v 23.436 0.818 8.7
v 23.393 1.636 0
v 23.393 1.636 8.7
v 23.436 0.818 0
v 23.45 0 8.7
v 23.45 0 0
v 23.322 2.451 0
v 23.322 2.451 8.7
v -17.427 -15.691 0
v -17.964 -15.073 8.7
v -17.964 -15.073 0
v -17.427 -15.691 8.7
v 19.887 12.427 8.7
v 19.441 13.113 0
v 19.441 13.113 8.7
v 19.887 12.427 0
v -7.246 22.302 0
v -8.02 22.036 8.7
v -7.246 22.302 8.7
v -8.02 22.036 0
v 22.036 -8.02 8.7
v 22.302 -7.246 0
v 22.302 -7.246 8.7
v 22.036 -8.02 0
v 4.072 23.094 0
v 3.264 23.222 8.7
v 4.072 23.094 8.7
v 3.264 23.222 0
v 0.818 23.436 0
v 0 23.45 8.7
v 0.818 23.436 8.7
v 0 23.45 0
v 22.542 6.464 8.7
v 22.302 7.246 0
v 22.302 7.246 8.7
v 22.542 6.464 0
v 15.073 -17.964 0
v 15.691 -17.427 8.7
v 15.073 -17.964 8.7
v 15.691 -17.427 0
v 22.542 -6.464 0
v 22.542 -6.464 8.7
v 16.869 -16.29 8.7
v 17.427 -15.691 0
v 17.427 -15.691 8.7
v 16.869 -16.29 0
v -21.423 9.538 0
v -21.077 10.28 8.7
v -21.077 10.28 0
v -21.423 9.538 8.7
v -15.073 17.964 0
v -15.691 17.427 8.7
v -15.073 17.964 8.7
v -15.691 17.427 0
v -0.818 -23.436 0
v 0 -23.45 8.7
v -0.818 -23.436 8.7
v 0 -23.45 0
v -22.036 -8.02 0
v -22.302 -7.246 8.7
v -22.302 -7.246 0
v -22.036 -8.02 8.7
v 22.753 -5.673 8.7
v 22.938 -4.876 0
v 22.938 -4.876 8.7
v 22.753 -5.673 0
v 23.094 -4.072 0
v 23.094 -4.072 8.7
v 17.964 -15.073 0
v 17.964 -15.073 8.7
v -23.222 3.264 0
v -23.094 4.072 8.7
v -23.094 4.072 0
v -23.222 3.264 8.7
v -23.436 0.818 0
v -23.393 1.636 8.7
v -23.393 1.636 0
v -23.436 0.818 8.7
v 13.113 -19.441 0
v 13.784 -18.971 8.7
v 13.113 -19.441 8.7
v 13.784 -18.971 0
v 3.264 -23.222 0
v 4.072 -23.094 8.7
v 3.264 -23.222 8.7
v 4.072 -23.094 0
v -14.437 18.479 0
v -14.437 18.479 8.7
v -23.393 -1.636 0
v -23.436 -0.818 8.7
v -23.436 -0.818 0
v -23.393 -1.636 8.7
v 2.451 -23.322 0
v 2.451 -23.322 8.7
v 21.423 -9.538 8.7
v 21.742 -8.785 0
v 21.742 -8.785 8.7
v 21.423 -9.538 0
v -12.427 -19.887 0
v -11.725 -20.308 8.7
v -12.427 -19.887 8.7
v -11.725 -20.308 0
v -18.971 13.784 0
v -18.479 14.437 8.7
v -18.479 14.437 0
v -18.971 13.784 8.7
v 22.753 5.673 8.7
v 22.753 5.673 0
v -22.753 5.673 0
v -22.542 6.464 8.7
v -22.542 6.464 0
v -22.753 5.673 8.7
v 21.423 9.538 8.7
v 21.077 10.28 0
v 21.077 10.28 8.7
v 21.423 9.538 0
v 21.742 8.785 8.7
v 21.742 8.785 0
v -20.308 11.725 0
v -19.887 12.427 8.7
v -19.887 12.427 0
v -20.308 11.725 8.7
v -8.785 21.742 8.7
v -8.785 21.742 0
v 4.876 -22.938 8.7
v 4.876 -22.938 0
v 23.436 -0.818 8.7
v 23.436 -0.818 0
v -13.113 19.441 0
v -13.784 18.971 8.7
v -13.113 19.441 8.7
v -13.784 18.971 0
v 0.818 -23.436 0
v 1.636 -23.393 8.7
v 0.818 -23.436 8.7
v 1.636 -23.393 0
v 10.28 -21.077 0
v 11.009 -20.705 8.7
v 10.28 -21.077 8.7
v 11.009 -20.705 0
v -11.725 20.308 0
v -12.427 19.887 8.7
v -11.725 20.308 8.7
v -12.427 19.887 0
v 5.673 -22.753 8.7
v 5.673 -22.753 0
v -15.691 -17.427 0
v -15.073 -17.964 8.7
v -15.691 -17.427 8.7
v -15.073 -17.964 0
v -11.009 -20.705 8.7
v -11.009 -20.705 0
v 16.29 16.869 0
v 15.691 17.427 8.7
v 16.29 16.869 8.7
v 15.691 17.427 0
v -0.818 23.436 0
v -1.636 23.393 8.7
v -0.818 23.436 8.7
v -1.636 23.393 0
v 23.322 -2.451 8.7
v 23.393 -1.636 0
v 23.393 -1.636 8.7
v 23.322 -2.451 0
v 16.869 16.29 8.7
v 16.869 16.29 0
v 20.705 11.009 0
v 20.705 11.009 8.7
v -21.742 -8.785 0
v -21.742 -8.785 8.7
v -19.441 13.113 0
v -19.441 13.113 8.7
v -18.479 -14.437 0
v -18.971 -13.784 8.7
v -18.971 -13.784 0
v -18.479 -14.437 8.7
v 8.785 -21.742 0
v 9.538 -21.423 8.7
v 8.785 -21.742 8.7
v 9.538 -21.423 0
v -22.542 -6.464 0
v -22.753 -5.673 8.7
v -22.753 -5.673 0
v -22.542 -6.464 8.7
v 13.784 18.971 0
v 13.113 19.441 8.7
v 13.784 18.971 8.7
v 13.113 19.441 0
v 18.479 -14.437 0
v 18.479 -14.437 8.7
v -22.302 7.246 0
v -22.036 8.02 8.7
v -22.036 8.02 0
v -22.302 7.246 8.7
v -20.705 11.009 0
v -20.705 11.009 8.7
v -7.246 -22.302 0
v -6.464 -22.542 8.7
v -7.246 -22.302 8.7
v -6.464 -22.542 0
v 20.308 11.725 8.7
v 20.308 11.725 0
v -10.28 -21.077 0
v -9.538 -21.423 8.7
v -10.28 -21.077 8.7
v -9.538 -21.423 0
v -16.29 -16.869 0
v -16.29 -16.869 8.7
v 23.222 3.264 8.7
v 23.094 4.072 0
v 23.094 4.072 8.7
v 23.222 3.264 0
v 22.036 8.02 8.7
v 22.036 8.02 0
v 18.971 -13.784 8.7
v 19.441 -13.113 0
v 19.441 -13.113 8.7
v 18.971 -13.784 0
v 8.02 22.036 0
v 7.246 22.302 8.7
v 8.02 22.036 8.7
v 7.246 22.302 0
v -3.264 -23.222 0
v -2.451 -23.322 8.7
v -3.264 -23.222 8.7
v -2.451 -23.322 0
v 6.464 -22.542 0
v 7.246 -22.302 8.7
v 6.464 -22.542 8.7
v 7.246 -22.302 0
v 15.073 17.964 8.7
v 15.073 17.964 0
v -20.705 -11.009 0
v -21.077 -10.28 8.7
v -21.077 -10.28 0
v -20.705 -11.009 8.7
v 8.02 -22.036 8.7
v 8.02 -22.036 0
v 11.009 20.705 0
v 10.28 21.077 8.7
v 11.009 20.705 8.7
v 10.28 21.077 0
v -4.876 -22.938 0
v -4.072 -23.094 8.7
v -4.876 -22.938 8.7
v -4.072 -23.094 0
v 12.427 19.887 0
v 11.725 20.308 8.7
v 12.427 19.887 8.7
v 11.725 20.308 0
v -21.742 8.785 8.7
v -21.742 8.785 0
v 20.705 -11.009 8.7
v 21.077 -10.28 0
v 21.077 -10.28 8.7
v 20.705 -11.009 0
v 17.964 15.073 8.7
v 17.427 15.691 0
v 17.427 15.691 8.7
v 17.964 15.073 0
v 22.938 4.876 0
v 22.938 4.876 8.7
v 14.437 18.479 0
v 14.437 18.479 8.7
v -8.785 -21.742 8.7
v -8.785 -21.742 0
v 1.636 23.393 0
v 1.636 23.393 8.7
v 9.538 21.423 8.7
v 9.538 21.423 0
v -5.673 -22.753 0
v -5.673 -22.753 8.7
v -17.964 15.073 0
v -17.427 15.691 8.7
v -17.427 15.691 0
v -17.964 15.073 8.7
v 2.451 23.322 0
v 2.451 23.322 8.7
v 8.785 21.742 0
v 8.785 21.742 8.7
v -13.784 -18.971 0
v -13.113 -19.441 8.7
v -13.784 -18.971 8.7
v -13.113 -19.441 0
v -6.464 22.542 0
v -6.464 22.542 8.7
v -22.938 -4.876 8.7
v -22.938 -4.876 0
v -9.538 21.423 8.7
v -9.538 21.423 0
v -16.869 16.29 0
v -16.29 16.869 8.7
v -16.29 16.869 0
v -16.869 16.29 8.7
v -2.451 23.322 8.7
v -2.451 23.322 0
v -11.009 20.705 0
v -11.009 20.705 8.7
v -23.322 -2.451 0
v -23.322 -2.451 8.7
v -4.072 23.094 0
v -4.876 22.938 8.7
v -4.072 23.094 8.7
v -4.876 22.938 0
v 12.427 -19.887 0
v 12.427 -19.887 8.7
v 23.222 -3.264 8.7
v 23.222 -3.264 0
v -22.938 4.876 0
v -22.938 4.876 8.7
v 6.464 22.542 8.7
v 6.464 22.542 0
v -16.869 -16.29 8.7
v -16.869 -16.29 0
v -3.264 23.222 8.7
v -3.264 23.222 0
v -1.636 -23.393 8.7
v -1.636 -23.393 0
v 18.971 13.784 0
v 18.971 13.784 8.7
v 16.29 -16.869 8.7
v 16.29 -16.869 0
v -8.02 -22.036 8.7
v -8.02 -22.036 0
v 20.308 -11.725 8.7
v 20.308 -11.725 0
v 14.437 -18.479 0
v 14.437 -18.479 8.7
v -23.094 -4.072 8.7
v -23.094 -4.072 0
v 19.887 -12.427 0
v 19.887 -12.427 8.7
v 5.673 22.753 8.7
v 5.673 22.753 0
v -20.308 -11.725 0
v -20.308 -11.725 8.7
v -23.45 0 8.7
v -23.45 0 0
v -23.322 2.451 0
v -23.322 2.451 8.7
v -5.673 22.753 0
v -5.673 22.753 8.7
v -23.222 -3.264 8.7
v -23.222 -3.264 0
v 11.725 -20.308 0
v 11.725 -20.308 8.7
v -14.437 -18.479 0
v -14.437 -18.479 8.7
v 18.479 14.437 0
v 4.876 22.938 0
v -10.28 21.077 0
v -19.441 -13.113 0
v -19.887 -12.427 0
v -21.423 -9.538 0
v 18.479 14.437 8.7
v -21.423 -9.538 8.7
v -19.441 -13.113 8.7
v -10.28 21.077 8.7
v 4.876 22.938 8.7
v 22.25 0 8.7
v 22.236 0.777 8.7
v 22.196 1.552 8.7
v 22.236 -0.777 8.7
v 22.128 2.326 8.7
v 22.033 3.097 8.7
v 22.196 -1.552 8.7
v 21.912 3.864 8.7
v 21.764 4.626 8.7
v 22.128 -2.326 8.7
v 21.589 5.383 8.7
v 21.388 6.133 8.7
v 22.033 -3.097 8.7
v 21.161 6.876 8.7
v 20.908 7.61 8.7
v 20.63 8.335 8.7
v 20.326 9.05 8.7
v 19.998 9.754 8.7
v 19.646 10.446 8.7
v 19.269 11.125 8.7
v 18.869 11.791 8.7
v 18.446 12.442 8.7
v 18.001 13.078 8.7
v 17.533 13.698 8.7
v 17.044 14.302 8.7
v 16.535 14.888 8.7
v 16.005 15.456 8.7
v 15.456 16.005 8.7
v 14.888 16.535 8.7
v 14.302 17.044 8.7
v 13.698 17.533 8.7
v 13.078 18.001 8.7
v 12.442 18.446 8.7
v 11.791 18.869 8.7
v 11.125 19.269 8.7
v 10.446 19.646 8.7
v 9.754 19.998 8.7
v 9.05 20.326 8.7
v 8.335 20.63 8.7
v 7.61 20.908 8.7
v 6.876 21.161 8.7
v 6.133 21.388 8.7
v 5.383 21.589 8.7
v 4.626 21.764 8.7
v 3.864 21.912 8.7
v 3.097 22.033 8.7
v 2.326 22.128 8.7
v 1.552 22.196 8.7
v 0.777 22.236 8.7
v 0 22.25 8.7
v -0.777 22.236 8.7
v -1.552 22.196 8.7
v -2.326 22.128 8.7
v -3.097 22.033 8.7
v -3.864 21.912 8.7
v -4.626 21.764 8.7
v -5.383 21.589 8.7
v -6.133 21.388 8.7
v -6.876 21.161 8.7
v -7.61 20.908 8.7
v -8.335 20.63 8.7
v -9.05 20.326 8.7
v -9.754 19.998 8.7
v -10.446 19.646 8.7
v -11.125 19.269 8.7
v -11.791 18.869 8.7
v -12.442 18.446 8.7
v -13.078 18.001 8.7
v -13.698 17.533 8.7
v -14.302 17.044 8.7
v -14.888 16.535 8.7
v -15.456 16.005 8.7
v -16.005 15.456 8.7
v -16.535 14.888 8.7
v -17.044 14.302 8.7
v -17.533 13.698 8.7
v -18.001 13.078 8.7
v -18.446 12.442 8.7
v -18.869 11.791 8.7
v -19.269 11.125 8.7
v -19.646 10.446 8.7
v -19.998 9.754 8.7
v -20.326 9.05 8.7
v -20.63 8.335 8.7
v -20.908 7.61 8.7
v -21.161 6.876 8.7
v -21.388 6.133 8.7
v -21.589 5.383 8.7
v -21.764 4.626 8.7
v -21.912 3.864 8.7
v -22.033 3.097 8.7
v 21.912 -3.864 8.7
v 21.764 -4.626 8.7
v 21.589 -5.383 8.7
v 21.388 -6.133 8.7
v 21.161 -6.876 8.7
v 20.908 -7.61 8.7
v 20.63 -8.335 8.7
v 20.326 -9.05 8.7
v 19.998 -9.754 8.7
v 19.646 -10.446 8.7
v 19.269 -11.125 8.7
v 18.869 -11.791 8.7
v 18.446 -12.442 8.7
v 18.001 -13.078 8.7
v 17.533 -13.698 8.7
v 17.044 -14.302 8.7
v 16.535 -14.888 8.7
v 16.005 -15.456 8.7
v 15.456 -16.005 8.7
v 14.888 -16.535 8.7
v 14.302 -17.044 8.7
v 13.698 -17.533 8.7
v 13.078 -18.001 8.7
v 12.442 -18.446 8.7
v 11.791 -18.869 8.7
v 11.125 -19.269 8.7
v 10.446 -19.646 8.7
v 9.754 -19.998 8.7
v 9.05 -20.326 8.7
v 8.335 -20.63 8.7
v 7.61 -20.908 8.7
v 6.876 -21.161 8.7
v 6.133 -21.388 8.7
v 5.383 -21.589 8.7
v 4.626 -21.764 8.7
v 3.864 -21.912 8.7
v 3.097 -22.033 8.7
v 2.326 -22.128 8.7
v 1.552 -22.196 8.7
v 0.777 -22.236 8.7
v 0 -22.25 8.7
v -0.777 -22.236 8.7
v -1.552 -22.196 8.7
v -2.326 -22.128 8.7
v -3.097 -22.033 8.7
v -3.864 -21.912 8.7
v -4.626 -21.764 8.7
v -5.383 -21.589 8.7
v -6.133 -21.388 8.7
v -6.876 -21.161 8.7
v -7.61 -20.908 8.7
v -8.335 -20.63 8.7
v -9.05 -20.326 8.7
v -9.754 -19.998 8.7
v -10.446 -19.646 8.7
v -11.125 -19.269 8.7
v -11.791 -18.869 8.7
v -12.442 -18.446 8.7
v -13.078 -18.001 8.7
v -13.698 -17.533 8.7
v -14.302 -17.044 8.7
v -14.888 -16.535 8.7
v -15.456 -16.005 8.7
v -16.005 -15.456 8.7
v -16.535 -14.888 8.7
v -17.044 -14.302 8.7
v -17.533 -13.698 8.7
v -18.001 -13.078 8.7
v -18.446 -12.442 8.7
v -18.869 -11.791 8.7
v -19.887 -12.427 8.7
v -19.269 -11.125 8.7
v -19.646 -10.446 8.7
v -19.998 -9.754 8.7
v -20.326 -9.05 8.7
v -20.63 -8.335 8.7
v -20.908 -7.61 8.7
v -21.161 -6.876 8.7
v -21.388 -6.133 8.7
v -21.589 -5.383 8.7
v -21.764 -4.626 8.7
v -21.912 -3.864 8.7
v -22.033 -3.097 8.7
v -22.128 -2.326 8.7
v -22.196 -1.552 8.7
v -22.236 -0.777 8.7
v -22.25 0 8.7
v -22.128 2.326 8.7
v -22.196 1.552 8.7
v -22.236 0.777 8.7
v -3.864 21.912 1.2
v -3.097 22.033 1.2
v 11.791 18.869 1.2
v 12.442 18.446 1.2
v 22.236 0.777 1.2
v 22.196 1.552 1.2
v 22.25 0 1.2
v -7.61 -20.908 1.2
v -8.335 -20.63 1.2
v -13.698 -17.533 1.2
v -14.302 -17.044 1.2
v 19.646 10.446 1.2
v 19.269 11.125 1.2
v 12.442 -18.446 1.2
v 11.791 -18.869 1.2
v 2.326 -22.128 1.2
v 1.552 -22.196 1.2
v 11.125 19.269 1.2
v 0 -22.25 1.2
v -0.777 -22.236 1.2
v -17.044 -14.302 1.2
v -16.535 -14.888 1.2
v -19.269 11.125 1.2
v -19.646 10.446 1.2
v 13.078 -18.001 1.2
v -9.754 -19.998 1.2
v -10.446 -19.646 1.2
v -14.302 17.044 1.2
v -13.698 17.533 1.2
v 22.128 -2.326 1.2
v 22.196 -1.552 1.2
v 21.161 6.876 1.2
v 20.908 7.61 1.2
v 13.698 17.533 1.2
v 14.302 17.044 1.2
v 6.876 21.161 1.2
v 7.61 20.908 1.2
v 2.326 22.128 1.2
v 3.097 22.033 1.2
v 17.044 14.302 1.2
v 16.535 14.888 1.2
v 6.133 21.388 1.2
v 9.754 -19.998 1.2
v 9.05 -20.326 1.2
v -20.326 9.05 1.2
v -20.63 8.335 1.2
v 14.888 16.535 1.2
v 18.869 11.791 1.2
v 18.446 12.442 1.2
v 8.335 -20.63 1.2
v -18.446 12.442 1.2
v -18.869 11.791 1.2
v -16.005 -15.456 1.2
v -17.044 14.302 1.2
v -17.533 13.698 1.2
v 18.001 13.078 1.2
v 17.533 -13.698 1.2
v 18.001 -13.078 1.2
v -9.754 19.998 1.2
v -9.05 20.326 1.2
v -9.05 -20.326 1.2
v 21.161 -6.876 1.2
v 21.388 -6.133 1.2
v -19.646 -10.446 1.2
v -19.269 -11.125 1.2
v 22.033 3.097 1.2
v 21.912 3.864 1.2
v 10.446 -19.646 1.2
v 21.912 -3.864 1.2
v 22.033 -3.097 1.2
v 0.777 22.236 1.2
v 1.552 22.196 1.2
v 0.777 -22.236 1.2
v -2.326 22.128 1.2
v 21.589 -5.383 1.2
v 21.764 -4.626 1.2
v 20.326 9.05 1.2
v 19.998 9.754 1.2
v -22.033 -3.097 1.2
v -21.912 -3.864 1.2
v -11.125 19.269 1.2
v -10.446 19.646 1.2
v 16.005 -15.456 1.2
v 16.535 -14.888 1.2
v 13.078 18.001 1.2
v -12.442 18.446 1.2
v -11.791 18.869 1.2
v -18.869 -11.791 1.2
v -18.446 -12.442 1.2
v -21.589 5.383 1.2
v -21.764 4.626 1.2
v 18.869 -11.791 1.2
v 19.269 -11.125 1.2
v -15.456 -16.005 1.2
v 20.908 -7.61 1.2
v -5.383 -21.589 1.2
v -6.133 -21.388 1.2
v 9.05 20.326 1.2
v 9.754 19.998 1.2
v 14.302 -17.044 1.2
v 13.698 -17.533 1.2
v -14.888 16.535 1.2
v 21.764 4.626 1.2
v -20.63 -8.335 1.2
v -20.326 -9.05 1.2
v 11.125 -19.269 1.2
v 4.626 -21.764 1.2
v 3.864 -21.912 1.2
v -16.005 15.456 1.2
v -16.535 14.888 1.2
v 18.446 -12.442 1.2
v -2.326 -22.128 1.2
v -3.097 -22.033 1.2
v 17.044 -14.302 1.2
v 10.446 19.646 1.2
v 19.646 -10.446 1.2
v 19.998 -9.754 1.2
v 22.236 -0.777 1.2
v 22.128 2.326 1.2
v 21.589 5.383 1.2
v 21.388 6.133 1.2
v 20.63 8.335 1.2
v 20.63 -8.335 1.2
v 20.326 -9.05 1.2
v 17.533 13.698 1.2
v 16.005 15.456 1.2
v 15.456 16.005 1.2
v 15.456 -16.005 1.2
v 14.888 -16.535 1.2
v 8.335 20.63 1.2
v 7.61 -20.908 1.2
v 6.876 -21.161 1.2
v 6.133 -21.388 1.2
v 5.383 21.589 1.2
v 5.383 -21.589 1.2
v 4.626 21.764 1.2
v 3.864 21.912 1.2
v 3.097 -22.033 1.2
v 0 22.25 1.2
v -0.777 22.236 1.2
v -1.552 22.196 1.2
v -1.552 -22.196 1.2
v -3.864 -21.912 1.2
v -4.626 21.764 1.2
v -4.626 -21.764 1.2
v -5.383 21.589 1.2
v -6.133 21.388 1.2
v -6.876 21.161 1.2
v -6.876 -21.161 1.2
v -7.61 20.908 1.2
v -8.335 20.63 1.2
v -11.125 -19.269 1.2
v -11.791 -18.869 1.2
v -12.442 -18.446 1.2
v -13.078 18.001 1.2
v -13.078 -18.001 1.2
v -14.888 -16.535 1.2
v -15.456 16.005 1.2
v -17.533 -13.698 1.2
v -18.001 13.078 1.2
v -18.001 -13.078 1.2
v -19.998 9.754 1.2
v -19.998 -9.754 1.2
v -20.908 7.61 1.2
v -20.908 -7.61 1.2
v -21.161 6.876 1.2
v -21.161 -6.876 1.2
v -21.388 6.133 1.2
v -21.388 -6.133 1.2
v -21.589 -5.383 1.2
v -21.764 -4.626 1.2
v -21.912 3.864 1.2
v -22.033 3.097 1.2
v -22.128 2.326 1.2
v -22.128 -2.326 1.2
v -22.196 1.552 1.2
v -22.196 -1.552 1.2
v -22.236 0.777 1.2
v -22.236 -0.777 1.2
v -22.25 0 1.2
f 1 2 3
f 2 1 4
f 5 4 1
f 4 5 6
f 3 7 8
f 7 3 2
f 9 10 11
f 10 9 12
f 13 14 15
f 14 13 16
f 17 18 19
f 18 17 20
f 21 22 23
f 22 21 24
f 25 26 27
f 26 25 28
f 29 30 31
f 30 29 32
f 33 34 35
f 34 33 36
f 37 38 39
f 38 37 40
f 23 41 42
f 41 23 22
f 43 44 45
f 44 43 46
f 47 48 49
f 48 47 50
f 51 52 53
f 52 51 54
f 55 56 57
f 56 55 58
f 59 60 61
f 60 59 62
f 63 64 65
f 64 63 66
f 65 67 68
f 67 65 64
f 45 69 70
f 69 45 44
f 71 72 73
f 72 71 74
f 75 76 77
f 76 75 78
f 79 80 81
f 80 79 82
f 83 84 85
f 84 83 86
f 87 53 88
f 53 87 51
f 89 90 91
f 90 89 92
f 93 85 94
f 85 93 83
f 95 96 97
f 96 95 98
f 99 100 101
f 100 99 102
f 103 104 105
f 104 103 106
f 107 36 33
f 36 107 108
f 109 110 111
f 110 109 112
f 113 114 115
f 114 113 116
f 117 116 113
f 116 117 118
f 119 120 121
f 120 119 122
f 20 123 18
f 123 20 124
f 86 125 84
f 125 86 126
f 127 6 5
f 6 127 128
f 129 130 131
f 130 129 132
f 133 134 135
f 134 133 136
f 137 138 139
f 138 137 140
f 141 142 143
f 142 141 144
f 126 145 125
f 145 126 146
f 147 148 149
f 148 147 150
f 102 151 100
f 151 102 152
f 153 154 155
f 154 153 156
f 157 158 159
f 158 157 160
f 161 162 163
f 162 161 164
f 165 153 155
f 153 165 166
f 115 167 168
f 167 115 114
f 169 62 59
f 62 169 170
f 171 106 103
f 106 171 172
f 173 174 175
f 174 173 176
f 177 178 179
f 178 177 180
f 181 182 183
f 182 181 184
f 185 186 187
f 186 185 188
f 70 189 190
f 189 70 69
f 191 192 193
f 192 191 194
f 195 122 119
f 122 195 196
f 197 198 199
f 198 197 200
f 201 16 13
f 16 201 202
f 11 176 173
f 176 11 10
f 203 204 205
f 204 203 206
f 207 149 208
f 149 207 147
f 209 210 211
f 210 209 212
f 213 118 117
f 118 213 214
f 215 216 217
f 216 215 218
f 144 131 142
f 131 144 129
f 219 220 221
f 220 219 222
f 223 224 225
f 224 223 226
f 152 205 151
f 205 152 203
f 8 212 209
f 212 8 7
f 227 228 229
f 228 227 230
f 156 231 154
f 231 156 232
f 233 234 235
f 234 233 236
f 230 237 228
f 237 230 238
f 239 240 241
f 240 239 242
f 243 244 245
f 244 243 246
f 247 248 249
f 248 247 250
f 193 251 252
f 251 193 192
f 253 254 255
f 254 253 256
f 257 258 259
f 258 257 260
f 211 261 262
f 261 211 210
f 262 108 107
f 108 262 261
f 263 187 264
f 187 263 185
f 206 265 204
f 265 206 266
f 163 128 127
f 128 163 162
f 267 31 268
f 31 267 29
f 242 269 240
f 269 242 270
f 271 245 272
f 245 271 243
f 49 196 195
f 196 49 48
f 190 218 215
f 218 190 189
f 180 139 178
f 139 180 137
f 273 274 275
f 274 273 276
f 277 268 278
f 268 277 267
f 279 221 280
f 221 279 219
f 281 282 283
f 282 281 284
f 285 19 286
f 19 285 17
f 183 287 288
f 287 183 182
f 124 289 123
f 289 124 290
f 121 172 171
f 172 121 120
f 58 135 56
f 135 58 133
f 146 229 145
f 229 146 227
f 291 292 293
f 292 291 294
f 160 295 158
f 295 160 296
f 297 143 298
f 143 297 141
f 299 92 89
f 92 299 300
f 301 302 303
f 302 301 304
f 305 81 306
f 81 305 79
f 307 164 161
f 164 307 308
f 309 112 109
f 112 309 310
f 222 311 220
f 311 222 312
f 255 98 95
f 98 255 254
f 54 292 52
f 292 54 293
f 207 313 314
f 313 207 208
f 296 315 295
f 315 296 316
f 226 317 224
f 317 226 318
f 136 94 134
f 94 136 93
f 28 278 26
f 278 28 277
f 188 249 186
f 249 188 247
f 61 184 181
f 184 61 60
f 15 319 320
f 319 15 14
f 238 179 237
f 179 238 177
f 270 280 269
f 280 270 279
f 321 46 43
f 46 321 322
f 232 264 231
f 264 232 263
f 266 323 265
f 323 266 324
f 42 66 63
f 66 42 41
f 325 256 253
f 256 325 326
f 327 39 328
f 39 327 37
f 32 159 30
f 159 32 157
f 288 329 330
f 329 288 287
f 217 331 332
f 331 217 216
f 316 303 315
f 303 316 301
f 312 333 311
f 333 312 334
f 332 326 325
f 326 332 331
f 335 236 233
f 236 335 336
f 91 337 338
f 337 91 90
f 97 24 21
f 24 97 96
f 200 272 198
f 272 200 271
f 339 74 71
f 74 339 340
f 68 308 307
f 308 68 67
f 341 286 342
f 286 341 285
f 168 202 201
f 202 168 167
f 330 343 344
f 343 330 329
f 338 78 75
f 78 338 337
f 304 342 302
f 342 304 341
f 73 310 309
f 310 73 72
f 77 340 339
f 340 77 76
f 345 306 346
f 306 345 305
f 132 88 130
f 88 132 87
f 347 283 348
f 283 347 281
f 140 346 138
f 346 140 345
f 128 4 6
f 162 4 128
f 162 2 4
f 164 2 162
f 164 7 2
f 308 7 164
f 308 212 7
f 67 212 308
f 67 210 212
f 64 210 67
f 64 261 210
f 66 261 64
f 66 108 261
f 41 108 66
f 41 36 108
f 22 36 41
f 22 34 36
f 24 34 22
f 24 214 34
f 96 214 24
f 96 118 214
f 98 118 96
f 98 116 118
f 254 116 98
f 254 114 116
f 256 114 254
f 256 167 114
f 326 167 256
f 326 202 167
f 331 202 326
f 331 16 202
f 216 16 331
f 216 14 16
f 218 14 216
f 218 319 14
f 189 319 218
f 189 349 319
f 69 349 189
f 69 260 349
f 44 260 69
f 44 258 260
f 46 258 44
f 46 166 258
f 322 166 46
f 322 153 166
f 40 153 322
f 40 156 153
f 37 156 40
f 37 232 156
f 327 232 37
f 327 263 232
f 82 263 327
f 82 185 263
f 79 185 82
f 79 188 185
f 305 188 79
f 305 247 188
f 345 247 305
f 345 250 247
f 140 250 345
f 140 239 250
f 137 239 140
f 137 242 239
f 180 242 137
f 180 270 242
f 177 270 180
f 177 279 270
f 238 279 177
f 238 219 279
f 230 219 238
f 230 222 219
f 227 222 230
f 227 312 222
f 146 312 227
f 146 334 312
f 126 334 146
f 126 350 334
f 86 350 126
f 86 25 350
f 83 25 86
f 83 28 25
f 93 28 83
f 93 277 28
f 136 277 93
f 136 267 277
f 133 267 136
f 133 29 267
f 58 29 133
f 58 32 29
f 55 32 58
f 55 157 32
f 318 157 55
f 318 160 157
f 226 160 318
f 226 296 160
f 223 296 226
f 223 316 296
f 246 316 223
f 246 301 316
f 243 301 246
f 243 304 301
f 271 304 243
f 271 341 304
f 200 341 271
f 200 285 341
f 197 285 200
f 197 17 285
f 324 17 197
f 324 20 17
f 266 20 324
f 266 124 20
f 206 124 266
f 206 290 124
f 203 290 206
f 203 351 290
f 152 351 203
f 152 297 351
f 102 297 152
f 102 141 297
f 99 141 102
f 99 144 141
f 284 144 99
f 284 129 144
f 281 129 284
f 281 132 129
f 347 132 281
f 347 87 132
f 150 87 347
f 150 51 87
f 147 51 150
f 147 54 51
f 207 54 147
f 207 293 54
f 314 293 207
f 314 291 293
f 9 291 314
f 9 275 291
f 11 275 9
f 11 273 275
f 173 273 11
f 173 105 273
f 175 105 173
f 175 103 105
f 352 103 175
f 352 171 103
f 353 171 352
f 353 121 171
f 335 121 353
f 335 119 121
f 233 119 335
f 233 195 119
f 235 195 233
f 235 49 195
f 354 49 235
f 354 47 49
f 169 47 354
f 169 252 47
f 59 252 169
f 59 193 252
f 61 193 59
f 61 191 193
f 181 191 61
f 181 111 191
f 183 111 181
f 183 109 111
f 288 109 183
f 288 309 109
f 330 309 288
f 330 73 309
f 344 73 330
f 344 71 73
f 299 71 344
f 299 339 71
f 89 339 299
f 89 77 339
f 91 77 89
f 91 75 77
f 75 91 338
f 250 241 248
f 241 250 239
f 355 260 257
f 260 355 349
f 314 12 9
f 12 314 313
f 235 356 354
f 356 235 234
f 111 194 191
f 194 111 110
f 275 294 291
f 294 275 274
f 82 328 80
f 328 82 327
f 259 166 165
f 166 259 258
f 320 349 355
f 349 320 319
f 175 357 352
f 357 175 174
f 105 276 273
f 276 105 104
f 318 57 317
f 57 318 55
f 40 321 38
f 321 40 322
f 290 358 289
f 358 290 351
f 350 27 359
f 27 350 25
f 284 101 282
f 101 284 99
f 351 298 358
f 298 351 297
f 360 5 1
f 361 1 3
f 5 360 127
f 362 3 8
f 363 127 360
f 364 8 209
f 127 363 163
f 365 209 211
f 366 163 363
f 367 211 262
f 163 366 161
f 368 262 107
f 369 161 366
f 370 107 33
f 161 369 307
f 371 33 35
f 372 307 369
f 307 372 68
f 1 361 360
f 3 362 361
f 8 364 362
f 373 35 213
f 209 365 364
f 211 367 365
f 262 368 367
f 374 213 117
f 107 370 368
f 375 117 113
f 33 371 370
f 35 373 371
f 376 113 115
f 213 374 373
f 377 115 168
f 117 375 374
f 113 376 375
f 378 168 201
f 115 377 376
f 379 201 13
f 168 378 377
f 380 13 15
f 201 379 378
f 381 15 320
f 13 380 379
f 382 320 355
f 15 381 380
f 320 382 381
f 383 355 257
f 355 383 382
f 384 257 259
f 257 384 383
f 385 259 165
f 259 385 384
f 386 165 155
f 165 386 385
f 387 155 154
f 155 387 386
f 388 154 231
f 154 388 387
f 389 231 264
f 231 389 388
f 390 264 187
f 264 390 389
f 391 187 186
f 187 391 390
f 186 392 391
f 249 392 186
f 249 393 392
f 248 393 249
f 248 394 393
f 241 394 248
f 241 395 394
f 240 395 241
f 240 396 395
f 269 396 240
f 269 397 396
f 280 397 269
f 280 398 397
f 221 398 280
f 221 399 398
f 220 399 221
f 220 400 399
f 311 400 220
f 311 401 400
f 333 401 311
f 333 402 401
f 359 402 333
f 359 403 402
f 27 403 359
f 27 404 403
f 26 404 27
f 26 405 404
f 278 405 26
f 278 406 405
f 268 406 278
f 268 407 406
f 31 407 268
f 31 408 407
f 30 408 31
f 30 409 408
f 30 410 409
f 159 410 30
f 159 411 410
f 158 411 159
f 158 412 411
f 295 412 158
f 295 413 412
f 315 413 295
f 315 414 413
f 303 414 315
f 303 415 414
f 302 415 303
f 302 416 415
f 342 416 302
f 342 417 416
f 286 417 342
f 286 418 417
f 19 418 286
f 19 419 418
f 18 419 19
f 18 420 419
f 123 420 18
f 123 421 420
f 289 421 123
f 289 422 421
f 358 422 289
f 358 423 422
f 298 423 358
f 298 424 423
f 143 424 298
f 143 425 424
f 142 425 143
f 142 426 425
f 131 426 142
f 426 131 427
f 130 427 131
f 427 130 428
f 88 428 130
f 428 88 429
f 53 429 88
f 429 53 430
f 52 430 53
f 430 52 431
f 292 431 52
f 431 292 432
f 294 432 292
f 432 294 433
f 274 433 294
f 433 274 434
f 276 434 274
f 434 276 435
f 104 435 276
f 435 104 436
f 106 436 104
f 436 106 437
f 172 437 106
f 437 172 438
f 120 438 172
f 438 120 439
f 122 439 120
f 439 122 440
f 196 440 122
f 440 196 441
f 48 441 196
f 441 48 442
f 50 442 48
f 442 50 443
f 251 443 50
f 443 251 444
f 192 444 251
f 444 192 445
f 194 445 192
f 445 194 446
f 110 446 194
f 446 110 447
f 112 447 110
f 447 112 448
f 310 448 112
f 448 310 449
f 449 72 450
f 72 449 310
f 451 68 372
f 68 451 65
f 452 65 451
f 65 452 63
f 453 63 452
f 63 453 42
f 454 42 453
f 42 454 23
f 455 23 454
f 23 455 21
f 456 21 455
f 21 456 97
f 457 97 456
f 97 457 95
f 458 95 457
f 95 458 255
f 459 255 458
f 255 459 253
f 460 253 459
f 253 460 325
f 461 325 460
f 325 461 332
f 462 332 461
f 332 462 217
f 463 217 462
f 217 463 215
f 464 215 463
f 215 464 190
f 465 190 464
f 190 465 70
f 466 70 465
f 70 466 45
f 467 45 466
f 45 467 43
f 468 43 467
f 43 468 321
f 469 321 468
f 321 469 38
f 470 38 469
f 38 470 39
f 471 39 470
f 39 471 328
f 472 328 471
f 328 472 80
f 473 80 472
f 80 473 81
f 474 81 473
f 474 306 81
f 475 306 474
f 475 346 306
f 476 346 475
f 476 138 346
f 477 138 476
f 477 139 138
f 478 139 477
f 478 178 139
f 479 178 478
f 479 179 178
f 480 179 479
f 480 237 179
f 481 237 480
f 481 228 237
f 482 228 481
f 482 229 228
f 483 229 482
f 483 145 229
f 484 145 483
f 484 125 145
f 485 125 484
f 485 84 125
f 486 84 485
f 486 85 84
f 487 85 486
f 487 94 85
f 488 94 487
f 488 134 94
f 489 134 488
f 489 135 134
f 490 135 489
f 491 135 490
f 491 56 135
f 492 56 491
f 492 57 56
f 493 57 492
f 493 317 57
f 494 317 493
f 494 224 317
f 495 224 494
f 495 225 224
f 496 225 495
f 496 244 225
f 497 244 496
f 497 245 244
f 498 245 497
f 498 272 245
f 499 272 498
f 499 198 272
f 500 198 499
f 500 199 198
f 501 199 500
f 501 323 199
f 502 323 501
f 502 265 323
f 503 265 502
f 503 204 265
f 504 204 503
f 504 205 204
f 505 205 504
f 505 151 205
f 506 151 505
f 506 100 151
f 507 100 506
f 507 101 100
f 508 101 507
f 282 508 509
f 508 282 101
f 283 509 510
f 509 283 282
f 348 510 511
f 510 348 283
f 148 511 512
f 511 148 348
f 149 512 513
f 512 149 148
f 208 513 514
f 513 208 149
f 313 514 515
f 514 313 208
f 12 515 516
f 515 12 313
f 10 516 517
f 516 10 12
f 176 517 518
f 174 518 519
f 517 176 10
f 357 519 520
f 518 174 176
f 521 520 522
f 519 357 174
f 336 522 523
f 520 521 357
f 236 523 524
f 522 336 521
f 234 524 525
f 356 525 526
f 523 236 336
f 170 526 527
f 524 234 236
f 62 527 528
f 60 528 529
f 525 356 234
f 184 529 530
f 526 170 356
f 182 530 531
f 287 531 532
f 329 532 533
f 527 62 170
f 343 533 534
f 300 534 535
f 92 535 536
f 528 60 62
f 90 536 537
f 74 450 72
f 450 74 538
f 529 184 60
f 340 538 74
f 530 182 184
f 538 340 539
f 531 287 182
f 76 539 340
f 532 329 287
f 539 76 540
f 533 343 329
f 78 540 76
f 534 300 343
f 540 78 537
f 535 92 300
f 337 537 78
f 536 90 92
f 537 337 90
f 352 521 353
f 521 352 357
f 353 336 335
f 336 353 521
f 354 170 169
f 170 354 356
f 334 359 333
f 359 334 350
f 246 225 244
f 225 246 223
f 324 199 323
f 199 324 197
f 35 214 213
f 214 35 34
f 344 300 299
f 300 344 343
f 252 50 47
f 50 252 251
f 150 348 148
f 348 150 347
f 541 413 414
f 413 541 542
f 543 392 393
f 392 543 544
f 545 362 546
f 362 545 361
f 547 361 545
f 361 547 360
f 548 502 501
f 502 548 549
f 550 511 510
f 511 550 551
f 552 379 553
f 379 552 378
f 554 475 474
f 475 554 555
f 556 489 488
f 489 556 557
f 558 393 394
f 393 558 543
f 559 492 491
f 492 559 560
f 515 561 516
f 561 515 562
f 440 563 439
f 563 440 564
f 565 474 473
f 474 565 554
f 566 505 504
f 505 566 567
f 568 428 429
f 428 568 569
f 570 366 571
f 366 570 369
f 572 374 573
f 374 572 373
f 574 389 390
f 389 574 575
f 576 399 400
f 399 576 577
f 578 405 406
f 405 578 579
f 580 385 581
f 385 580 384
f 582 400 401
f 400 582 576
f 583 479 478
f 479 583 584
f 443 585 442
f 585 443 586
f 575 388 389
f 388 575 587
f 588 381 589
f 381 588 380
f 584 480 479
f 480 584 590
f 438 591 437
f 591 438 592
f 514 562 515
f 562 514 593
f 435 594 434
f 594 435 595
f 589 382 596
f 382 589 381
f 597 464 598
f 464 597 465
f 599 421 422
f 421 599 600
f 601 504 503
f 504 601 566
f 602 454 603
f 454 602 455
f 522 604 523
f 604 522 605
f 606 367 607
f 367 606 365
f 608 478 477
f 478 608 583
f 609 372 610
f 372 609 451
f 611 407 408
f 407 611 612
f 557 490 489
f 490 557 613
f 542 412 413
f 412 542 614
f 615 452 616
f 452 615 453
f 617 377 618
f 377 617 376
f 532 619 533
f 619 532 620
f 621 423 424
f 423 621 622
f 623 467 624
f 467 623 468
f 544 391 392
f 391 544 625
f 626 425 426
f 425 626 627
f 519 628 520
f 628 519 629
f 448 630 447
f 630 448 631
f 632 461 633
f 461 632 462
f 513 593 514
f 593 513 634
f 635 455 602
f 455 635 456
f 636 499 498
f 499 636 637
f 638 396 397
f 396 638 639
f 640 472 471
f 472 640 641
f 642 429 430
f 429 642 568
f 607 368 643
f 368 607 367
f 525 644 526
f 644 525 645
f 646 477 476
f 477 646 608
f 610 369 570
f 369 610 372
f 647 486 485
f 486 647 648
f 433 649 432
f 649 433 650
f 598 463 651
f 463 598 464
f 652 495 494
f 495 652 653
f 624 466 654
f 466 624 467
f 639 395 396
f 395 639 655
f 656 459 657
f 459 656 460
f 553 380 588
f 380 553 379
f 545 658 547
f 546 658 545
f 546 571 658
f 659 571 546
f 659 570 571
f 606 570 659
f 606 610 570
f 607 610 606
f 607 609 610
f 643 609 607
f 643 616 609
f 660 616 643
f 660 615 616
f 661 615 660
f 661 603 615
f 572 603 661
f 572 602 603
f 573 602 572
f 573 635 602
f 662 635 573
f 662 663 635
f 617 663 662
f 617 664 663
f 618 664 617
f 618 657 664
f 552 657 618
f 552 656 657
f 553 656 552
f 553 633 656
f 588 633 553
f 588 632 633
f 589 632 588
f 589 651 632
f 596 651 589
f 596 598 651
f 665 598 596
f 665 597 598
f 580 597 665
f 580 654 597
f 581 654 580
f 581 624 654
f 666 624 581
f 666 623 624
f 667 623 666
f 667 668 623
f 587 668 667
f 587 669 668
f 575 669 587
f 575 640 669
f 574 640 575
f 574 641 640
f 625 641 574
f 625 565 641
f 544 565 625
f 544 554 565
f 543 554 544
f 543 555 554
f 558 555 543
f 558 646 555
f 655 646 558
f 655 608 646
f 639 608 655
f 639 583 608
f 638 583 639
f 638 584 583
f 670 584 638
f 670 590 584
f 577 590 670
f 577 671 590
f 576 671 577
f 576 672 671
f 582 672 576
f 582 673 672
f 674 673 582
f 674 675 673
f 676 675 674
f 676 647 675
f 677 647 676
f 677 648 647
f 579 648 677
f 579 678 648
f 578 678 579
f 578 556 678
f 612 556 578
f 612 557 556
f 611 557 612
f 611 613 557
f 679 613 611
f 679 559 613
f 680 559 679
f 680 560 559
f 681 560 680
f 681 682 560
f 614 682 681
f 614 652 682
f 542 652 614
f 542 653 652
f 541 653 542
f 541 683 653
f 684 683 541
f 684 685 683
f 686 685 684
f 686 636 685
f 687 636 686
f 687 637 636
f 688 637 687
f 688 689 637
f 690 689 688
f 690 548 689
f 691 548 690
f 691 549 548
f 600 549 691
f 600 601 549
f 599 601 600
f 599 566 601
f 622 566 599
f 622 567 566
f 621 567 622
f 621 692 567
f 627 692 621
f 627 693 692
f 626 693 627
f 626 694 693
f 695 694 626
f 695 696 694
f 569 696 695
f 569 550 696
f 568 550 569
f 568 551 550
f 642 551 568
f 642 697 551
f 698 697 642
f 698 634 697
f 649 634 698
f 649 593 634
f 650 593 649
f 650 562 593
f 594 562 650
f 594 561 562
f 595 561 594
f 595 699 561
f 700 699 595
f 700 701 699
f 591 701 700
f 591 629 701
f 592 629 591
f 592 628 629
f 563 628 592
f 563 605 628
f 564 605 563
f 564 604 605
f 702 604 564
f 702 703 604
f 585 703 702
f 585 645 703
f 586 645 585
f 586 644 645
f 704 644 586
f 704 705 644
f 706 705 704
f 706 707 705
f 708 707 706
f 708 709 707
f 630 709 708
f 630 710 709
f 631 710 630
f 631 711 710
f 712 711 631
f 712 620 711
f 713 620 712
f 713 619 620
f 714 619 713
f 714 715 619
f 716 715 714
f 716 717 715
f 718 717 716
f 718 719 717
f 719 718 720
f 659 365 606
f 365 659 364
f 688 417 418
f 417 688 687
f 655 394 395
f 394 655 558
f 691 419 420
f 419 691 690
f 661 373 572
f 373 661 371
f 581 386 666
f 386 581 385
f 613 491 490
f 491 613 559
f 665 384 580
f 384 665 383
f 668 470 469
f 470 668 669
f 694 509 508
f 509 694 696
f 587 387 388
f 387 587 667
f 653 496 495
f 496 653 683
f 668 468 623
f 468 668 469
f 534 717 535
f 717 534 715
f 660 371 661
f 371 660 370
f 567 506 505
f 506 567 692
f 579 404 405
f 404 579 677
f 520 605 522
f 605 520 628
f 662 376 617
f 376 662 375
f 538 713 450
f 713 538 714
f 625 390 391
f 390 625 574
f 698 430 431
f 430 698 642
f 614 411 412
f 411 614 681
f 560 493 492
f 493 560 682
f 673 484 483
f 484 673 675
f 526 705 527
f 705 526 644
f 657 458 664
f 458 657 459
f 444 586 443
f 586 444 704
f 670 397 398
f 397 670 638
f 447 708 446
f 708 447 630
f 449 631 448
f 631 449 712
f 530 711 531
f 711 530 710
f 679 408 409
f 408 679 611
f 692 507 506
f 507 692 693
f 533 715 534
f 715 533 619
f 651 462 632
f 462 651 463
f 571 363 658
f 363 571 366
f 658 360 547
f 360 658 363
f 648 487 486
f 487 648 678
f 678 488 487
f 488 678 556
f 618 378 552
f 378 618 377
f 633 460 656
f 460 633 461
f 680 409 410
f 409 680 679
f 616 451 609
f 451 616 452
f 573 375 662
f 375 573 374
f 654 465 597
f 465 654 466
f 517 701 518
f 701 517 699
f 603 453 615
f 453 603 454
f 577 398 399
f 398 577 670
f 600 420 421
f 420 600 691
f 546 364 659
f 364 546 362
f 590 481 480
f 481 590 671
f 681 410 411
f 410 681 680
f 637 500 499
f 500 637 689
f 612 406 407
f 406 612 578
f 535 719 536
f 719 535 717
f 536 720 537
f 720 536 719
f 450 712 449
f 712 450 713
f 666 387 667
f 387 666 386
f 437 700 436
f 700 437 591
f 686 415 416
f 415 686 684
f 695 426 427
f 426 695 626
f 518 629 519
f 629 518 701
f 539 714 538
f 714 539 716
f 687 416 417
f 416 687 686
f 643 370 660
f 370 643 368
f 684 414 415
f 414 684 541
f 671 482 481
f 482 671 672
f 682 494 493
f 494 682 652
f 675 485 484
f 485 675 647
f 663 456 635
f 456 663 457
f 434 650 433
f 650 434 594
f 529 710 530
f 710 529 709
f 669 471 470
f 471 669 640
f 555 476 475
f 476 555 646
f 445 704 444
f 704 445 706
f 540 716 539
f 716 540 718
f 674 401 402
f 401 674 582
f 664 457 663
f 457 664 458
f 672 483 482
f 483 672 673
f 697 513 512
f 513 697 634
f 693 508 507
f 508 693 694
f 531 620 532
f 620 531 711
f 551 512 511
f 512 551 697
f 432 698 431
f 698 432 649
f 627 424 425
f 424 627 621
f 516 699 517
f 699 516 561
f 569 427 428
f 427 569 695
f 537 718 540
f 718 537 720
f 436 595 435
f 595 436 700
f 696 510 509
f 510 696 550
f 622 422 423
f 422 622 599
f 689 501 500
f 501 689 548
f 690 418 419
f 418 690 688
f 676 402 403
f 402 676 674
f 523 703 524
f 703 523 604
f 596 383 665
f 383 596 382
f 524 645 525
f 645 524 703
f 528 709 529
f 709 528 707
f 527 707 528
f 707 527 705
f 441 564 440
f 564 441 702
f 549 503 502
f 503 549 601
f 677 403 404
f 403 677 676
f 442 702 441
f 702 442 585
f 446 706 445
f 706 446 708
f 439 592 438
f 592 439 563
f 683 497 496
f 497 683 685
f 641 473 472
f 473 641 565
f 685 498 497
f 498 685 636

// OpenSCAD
$fn=180;

inside = 44.5 / 2;
thickness = 1.2;
height = 7.5;

difference() {
	cylinder(r = inside + thickness, h = height + thickness);
	translate([0,0,thickness])
		cylinder(r = inside, h = height + 1);
}
